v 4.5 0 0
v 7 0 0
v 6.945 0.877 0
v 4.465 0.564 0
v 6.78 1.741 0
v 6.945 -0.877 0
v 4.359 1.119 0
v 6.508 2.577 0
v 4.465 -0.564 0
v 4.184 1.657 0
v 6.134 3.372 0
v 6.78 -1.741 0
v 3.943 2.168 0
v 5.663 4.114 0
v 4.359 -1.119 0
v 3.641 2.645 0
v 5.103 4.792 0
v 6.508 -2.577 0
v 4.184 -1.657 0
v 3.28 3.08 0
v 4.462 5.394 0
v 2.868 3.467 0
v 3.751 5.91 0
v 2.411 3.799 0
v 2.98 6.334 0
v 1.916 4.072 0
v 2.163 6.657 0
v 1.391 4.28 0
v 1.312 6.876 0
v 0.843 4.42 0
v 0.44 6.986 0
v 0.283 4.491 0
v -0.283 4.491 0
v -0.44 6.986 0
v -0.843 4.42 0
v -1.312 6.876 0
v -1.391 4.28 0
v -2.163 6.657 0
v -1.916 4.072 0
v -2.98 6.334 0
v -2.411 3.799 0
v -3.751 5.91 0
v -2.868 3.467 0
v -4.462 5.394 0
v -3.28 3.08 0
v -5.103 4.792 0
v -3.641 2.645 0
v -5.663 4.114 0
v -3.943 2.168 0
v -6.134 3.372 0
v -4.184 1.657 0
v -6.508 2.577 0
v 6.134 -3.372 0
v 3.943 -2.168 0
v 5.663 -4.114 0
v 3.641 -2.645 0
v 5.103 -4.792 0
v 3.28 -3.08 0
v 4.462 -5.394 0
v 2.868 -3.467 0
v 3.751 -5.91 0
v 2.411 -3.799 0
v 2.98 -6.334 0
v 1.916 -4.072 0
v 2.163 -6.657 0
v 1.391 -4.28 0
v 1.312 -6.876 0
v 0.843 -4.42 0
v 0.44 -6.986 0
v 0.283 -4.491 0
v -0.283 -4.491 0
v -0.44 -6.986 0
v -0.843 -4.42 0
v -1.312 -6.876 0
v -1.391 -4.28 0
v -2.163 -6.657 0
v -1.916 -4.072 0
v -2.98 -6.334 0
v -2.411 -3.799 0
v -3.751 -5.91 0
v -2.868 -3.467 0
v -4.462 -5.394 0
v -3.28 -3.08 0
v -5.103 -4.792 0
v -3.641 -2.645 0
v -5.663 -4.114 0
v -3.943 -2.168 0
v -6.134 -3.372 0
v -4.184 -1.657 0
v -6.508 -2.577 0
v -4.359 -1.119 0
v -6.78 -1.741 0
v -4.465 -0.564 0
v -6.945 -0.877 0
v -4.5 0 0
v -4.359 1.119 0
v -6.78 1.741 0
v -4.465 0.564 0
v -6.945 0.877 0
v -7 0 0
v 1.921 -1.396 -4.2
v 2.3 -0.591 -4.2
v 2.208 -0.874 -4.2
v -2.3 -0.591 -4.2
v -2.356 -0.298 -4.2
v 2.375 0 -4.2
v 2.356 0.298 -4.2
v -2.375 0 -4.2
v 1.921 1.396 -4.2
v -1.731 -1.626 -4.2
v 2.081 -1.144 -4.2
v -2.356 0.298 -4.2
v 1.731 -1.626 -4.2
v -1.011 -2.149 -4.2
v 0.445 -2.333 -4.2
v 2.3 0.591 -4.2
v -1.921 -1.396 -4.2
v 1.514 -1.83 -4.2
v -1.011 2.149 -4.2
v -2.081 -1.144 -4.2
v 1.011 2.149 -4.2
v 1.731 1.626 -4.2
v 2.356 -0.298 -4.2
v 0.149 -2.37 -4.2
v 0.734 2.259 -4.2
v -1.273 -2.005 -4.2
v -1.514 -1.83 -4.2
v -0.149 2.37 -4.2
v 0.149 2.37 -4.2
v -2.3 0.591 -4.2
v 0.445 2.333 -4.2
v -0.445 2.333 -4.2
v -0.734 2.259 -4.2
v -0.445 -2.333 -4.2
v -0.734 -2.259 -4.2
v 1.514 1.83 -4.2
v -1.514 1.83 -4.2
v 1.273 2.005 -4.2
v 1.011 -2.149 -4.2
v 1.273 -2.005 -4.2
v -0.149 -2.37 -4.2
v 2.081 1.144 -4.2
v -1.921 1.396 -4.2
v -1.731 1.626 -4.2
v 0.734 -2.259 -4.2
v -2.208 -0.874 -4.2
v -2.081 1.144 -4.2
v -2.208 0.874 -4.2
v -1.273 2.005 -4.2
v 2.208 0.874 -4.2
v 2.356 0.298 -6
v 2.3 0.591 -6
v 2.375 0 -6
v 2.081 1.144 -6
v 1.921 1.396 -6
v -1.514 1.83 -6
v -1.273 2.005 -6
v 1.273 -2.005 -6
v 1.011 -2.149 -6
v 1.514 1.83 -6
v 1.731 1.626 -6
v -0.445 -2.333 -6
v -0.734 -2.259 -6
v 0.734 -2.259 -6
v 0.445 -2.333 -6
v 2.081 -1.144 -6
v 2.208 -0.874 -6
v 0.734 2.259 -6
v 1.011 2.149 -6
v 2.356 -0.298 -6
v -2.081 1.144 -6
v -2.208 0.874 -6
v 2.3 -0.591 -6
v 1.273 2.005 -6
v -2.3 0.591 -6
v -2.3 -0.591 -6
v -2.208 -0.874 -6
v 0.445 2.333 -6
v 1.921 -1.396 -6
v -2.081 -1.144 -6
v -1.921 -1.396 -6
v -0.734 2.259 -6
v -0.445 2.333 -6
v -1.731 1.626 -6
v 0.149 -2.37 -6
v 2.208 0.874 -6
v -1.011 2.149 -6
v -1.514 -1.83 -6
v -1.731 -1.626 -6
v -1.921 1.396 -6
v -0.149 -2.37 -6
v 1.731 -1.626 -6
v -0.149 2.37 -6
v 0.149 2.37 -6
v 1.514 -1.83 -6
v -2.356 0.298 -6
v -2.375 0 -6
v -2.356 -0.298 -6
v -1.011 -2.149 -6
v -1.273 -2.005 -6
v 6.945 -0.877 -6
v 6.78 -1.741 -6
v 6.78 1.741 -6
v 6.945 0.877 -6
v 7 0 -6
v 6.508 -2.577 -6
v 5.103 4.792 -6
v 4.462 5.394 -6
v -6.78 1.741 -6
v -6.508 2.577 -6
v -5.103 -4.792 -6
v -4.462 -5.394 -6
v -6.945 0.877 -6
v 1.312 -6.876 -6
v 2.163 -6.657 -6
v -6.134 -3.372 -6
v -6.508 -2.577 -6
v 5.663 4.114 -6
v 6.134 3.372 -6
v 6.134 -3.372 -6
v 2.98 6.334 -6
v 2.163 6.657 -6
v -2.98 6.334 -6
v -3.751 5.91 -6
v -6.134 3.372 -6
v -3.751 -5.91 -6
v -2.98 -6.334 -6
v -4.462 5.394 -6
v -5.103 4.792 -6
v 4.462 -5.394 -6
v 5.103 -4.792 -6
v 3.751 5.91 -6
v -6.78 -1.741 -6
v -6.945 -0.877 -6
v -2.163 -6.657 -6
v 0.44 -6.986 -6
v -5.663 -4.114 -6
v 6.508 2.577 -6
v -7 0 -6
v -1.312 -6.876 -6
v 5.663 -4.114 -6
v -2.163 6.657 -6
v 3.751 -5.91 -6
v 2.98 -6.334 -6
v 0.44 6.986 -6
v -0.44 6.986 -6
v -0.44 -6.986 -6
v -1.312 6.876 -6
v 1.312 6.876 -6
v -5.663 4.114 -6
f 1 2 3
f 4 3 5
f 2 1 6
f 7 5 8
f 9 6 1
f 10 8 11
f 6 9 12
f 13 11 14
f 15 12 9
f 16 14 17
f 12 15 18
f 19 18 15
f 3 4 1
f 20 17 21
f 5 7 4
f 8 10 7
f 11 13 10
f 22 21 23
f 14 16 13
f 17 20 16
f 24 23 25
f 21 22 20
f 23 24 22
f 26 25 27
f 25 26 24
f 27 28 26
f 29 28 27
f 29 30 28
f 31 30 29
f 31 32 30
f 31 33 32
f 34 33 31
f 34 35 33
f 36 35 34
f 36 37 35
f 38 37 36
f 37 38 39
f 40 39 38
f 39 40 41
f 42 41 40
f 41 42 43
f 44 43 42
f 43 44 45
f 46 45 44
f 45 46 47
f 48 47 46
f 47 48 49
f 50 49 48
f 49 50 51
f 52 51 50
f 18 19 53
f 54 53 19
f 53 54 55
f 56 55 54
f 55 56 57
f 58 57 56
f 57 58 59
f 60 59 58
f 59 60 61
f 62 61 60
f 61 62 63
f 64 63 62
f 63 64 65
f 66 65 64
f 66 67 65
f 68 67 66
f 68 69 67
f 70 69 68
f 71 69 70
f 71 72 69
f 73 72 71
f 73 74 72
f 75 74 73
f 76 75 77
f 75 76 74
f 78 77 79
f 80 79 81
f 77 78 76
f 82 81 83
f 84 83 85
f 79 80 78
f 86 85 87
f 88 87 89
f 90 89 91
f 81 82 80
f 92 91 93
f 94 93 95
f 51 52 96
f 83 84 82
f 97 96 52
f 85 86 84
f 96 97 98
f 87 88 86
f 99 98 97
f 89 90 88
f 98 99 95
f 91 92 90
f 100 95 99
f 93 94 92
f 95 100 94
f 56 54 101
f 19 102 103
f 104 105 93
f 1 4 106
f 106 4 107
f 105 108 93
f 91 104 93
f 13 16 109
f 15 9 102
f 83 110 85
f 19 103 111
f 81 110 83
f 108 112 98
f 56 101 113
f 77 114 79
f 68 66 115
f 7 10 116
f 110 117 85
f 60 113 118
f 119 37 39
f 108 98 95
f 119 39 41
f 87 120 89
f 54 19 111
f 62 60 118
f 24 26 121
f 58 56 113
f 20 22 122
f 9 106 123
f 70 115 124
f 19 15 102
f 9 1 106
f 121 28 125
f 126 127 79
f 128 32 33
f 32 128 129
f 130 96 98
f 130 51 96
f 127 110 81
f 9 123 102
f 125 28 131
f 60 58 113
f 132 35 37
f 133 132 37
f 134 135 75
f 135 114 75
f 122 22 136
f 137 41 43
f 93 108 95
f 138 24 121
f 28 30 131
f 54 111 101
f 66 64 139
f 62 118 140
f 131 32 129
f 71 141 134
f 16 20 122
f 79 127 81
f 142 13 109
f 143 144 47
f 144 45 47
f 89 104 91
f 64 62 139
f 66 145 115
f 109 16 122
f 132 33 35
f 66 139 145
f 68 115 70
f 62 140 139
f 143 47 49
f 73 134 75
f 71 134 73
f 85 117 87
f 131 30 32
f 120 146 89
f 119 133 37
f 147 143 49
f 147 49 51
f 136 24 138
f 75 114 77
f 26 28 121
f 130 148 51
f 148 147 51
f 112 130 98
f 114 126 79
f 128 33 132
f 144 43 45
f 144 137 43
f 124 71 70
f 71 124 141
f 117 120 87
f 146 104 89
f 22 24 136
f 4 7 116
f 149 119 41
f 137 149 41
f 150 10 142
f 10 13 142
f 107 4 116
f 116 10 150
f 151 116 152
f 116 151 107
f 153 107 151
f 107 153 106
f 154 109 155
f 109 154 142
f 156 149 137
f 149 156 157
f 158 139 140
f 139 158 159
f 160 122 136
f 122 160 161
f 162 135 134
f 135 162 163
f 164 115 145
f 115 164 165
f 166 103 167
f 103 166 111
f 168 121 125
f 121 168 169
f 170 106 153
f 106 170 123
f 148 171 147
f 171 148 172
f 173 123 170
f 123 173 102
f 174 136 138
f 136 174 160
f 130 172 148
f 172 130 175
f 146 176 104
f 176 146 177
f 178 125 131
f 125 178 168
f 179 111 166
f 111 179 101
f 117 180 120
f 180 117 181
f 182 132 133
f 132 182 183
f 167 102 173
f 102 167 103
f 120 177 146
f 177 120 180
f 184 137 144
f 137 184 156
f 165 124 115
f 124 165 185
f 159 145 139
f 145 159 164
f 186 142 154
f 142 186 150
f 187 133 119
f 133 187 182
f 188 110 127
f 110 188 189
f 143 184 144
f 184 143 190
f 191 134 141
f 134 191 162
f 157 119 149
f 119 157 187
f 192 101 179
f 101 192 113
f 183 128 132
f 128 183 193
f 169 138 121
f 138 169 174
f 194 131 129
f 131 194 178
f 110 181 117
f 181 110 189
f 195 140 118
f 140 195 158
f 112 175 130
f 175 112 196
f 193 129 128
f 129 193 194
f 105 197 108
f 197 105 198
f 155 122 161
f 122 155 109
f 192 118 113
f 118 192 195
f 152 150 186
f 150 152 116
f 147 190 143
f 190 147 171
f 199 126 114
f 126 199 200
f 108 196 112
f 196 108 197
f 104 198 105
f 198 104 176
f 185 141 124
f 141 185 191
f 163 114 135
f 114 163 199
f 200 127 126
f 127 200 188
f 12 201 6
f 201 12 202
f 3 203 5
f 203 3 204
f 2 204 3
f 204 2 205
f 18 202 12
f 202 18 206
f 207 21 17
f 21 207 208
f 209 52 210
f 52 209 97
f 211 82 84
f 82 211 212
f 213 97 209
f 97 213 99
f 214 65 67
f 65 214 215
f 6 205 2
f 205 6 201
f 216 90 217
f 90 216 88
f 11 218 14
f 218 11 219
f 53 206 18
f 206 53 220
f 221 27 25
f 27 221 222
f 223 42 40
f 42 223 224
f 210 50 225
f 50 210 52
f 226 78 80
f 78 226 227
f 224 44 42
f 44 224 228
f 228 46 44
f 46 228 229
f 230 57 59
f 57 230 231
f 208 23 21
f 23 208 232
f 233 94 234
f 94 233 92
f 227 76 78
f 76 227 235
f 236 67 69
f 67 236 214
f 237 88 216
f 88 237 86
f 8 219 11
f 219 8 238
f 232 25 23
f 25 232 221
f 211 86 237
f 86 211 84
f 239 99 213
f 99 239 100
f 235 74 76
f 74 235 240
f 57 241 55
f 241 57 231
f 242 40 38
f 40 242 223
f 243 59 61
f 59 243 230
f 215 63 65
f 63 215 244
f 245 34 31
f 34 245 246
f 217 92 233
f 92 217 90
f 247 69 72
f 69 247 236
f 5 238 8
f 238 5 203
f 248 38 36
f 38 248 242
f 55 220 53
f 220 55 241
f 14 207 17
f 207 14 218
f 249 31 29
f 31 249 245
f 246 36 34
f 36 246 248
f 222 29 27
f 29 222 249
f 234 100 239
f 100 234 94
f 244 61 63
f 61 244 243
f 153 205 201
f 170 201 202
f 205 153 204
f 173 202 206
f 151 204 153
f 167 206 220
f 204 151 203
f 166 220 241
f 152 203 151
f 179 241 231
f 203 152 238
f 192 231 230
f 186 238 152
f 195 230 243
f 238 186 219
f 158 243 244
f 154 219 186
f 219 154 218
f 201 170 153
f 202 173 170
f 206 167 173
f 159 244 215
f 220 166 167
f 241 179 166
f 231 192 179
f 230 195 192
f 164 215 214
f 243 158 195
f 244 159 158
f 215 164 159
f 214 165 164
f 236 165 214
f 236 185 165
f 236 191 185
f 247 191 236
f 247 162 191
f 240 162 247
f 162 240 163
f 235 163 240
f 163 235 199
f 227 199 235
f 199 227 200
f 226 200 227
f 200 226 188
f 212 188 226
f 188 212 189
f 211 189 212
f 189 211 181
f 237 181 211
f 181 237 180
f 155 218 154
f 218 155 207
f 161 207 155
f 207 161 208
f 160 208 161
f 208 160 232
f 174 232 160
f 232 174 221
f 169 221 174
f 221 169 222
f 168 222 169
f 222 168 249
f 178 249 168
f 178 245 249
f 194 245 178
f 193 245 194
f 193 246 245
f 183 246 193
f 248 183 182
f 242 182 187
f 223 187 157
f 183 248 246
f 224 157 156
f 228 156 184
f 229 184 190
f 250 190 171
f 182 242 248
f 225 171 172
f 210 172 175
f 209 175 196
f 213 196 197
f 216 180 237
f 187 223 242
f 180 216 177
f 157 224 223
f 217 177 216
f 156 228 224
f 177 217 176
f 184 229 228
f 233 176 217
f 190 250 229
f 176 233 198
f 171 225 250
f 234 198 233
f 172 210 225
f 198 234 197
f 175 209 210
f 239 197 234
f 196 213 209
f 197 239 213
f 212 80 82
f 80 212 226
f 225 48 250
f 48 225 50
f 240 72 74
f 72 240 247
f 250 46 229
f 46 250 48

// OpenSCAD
$fn = 50;

difference() {
	union() {
		translate(v = [0, 0, -6.0]) {
			cylinder(h = 6, r = 7.0);
		}
	}
	union() {
		translate(v = [0, 0, 0]) {
			rotate(a = [0, 0, 0]) {
				difference() {
					union() {
						translate(v = [0, 0, -9.0]) {
							cylinder(h = 9, r = 2.25);
						}
						translate(v = [0, 0, -4.2]) {
							cylinder(h = 4.2, r1 = 2.375, r2 = 4.5);
						}
						translate(v = [0, 0, -9.0]) {
							cylinder(h = 9, r = 2.375);
						}
						translate(v = [0, 0, -9.0]) {
							cylinder(h = 9, r = 2.25);
						}
					}
					union();
				}
			}
		}
	}
}
